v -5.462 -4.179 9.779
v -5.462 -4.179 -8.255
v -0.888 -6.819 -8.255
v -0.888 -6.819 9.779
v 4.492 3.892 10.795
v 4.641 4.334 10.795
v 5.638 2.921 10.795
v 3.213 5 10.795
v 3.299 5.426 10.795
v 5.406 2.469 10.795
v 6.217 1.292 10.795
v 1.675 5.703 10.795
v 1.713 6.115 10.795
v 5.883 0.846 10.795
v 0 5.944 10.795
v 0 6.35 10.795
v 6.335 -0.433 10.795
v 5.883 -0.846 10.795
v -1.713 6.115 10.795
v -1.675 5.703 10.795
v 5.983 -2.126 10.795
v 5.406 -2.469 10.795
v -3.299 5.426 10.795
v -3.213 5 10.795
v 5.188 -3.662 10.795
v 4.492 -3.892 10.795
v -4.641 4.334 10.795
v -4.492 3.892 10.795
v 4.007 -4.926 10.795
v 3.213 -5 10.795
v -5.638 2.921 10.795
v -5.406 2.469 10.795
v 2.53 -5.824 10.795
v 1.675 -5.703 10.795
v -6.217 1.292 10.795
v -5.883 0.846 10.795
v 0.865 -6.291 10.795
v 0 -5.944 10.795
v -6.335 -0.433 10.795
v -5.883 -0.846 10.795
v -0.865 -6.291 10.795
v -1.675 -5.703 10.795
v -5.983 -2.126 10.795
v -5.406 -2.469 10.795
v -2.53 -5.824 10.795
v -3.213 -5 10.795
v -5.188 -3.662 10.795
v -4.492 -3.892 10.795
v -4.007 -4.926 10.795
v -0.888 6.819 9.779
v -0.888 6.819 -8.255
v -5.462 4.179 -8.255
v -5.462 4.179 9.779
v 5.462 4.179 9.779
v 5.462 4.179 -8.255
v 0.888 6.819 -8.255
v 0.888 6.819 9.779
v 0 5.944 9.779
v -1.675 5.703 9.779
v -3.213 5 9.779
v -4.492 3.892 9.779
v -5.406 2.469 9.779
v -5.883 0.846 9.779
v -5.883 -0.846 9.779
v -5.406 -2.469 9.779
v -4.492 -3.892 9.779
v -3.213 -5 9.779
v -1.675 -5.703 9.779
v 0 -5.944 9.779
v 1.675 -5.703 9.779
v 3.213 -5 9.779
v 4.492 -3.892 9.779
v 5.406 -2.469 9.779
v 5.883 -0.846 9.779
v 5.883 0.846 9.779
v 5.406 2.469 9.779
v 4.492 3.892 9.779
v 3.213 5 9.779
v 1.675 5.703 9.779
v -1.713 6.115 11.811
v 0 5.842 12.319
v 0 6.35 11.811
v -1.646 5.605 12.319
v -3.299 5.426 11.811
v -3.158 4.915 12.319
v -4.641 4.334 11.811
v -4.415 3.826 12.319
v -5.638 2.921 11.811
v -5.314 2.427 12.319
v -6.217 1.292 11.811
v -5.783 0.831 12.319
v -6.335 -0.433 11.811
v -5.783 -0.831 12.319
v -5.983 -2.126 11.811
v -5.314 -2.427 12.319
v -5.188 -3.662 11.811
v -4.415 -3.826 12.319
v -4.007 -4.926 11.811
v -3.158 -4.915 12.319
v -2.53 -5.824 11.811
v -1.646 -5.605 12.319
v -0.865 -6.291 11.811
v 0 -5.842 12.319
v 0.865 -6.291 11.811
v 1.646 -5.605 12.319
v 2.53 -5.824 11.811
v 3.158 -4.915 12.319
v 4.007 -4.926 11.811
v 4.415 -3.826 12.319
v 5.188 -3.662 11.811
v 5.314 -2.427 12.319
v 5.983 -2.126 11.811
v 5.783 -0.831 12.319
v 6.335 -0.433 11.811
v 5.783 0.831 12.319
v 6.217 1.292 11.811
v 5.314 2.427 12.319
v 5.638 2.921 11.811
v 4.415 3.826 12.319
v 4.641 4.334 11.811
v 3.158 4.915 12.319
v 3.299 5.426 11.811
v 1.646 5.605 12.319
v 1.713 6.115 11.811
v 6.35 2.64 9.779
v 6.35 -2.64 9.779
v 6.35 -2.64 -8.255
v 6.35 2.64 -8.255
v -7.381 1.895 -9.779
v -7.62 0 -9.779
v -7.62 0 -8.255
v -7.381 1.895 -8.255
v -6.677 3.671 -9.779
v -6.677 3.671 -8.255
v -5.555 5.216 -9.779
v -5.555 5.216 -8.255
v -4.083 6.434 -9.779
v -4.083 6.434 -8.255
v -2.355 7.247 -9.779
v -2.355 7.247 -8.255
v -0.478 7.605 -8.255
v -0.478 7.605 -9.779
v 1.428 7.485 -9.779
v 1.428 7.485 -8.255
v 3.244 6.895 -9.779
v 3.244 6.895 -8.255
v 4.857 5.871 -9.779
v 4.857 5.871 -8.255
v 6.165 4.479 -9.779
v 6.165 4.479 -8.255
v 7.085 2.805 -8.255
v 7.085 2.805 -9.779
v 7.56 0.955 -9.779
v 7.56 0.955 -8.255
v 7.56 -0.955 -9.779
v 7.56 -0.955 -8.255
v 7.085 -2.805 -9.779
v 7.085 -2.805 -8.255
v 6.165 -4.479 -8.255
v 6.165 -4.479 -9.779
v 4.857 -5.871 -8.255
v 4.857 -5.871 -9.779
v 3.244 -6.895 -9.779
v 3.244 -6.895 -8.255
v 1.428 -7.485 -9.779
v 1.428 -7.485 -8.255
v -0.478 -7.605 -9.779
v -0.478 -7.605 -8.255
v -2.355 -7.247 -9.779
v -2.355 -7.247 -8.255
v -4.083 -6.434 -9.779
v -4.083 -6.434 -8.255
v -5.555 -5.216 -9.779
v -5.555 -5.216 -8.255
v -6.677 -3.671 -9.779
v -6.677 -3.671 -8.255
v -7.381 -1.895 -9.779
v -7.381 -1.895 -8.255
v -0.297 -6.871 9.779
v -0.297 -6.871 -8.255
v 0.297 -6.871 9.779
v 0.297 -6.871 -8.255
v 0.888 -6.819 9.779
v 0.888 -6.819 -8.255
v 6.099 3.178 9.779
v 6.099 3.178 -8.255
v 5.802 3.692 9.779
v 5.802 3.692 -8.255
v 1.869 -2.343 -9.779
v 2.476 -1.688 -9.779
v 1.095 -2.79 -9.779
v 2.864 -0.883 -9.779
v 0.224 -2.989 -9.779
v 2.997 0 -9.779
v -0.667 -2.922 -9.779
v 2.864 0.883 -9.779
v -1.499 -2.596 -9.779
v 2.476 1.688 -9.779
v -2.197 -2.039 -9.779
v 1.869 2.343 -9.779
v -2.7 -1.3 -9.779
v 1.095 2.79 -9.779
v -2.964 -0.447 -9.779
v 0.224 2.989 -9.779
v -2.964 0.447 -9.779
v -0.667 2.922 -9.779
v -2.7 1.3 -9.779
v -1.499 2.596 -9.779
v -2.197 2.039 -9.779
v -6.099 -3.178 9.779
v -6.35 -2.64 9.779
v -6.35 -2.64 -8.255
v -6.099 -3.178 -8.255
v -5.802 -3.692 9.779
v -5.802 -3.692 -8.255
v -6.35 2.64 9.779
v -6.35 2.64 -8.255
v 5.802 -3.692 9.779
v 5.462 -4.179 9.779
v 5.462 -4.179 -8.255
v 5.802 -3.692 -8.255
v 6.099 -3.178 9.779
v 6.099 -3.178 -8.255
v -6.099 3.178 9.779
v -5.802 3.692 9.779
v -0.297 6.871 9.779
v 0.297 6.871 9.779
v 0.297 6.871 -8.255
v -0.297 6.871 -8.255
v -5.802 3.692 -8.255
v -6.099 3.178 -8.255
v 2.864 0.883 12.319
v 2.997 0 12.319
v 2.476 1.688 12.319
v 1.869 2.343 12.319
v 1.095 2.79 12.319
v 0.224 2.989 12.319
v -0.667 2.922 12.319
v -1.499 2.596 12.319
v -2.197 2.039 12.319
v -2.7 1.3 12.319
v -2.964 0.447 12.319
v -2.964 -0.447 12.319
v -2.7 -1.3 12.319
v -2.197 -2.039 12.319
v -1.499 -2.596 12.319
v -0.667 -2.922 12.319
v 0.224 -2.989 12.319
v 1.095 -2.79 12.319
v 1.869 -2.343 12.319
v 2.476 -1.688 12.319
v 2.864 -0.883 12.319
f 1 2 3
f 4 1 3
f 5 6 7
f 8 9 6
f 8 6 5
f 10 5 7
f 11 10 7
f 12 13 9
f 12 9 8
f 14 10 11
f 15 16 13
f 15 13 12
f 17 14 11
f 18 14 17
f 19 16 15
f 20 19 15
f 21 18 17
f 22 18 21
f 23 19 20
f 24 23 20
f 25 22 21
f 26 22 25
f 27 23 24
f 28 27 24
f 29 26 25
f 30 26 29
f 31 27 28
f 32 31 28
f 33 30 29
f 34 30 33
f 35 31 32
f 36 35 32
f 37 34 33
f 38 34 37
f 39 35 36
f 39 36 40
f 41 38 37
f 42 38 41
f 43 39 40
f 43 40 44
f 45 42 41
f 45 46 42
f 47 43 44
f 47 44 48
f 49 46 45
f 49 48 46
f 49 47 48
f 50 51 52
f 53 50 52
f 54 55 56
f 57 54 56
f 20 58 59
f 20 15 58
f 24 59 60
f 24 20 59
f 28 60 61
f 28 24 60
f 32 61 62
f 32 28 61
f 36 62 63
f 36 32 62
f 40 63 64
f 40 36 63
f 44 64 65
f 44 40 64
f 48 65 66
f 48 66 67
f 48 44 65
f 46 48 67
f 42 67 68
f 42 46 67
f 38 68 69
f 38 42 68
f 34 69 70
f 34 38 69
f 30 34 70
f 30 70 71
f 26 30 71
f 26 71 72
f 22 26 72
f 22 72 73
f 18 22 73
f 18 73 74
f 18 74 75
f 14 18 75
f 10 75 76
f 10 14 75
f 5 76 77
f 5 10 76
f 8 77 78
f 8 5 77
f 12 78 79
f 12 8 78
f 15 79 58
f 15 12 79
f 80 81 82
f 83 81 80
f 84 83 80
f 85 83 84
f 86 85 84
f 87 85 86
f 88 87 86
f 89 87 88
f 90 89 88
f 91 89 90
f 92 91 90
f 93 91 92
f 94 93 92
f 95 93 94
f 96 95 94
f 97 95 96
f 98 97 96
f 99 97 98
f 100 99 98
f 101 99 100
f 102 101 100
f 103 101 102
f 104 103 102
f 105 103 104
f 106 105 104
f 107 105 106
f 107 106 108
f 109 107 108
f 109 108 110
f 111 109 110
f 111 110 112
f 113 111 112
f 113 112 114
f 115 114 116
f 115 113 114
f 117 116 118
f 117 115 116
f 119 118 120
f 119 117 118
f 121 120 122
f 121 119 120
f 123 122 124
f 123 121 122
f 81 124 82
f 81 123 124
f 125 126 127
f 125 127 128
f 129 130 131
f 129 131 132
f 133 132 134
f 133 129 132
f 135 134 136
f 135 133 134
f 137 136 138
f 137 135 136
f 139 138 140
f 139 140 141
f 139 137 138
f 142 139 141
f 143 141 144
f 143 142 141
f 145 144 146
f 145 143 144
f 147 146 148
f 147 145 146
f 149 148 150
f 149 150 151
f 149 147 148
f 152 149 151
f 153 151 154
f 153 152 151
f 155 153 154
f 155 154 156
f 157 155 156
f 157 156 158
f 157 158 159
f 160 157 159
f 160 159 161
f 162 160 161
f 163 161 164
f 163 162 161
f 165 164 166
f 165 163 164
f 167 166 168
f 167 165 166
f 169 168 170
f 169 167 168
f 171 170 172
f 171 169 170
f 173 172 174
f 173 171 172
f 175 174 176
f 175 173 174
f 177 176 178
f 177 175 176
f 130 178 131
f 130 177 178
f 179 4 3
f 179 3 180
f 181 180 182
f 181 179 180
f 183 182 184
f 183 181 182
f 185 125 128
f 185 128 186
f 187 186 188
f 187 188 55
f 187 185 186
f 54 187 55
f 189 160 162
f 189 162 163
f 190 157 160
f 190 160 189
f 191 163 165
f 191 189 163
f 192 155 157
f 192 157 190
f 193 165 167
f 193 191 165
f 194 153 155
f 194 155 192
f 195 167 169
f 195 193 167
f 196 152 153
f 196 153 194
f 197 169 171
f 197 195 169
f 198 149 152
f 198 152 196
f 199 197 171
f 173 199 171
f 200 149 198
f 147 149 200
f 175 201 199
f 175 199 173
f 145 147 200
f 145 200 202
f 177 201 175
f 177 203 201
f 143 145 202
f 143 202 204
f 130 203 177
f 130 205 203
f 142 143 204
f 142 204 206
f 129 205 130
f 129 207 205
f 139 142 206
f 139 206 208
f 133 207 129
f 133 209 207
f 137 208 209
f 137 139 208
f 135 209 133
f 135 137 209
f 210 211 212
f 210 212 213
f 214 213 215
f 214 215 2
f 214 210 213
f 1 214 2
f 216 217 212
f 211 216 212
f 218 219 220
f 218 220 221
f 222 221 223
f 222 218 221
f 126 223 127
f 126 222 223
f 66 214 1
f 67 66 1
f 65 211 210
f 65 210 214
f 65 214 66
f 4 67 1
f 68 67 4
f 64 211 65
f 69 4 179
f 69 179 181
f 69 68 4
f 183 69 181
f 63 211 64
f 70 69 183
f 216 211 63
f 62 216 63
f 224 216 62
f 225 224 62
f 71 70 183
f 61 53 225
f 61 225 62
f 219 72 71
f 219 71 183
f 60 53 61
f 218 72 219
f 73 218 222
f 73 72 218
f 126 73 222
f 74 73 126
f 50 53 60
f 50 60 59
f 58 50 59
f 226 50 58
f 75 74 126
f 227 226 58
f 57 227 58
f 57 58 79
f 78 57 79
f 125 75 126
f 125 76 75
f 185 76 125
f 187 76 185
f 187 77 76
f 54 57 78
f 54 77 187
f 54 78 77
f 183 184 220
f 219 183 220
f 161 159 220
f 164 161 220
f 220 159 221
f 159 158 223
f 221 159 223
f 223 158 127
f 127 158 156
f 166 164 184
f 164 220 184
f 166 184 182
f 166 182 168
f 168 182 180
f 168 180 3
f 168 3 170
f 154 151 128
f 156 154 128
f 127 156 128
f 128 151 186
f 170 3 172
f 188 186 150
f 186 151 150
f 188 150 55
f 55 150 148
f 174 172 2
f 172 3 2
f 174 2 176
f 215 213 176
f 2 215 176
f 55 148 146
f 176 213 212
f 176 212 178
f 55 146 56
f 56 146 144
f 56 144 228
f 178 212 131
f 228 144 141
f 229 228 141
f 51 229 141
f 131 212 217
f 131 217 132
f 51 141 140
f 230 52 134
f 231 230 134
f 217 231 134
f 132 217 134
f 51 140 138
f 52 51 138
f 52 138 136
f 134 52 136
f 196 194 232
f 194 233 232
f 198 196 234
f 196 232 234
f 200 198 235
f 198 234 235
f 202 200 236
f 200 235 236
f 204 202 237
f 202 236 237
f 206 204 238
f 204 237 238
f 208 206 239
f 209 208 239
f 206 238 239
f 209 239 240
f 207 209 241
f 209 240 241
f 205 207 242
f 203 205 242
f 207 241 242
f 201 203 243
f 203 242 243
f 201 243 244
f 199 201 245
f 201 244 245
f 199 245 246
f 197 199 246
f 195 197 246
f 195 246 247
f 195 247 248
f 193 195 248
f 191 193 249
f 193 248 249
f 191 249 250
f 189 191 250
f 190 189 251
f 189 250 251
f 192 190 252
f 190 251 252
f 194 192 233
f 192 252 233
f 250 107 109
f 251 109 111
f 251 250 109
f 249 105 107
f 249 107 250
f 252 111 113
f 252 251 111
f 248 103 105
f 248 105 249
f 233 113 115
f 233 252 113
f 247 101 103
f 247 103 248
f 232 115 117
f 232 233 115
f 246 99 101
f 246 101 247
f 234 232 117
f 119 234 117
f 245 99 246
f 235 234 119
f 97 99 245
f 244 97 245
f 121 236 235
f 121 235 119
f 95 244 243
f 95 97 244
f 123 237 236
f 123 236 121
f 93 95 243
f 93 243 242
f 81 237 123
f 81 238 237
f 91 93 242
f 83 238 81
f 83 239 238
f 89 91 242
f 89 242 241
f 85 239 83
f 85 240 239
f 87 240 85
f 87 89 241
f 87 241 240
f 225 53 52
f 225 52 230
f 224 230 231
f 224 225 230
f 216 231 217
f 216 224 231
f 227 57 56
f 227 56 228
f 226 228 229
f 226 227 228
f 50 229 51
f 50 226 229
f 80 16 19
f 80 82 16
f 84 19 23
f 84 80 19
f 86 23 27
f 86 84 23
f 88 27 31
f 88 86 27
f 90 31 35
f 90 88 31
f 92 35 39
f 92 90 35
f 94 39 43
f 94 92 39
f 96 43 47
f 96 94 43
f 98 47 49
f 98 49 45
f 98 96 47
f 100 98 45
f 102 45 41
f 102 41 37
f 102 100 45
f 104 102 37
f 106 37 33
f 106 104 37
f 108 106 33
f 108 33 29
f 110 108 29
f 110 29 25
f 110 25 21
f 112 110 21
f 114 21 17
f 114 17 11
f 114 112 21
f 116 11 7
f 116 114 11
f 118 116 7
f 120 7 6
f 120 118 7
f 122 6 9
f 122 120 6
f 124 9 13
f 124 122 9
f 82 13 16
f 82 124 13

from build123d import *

# Parameters (mm, degrees)
SKETCH1_R               = 6.35
BASIC_ROD_DEPTH         = 9.779
BASIC_ROD_DEPTH_BACK    = 9.779
THEX_DEPTH              = 9.779
SKETCH2_R               = 2.9972
INTERNAL_CUT_DEPTH      = 13.319
INTERNAL_CUT_DEPTH_BACK = 10.779
SKETCH9_R               = 7.62
SKETCH9_R_2             = 2.9972
BOSS_EXTRUDE1_DEPTH     = 1.524


with BuildPart() as part:
    # Sketch1 → Basic Rod (new body, two sides)
    with BuildSketch(Plane.XY) as basic_rod_sk:
        Circle(SKETCH1_R)
    extrude(amount=BASIC_ROD_DEPTH)
    extrude(basic_rod_sk.sketch, amount=-BASIC_ROD_DEPTH_BACK)

    # Sketch8 → THex (add, symmetric)
    with BuildSketch(Plane.XY):
        with BuildLine():
            Line((-0.888411378, 6.819423871), (-5.461588622, 4.179098758))
            ThreePointArc((-5.461588622, 4.179098758), (-5.955700003, 3.438525), (-6.35, 2.640325113))
            Line((-6.35, 2.640325113), (-6.35, -2.640325113))
            ThreePointArc((-6.35, -2.640325113), (-5.955700003, -3.438525), (-5.461588622, -4.179098758))
            Line((-5.461588622, -4.179098758), (-0.888411378, -6.819423871))
            ThreePointArc((-0.888411378, -6.819423871), (0, -6.87705), (0.888411378, -6.819423871))
            Line((0.888411378, -6.819423871), (5.461588622, -4.179098758))
            ThreePointArc((5.461588622, -4.179098758), (5.955700003, -3.438525), (6.35, -2.640325113))
            Line((6.35, -2.640325113), (6.35, 2.640325113))
            ThreePointArc((6.35, 2.640325113), (5.955700003, 3.438525), (5.461588622, 4.179098758))
            Line((5.461588622, 4.179098758), (0.888411378, 6.819423871))
            ThreePointArc((0.888411378, 6.819423871), (0, 6.87705), (-0.888411378, 6.819423871))
        make_face()
    extrude(amount=THEX_DEPTH, both=True)

    # Sketch7 → 1stSnapRing (revolve)
    with BuildSketch(Plane(origin=(0, 0, 0), x_dir=(0, 0, -1), z_dir=(1, 0, 0))):
        Polygon((-9.779, 5.9436), (-10.795, 5.9436), (-10.795, 6.35), (-11.811, 6.35), (-12.319, 5.842), (-12.319, 0), (-9.779, 0), align=None)
    revolve(axis=Axis((0, 0, -38.2778), (0, 0, 1)))

    # Sketch2 → Internal Cut (cut, two sides)
    with BuildSketch(Plane.XY) as internal_cut_sk:
        Circle(SKETCH2_R)
    extrude(amount=INTERNAL_CUT_DEPTH, mode=Mode.SUBTRACT)
    extrude(internal_cut_sk.sketch, amount=-INTERNAL_CUT_DEPTH_BACK, mode=Mode.SUBTRACT)

    # Sketch9 → Boss-Extrude1 (add)
    with BuildSketch(Plane(origin=(0, 0, -9.779), x_dir=(-1, 0, 0), z_dir=(0, 0, -1))):
        Circle(SKETCH9_R)
        Circle(SKETCH9_R_2, mode=Mode.SUBTRACT)
    extrude(amount=-BOSS_EXTRUDE1_DEPTH)


solid = part.part
